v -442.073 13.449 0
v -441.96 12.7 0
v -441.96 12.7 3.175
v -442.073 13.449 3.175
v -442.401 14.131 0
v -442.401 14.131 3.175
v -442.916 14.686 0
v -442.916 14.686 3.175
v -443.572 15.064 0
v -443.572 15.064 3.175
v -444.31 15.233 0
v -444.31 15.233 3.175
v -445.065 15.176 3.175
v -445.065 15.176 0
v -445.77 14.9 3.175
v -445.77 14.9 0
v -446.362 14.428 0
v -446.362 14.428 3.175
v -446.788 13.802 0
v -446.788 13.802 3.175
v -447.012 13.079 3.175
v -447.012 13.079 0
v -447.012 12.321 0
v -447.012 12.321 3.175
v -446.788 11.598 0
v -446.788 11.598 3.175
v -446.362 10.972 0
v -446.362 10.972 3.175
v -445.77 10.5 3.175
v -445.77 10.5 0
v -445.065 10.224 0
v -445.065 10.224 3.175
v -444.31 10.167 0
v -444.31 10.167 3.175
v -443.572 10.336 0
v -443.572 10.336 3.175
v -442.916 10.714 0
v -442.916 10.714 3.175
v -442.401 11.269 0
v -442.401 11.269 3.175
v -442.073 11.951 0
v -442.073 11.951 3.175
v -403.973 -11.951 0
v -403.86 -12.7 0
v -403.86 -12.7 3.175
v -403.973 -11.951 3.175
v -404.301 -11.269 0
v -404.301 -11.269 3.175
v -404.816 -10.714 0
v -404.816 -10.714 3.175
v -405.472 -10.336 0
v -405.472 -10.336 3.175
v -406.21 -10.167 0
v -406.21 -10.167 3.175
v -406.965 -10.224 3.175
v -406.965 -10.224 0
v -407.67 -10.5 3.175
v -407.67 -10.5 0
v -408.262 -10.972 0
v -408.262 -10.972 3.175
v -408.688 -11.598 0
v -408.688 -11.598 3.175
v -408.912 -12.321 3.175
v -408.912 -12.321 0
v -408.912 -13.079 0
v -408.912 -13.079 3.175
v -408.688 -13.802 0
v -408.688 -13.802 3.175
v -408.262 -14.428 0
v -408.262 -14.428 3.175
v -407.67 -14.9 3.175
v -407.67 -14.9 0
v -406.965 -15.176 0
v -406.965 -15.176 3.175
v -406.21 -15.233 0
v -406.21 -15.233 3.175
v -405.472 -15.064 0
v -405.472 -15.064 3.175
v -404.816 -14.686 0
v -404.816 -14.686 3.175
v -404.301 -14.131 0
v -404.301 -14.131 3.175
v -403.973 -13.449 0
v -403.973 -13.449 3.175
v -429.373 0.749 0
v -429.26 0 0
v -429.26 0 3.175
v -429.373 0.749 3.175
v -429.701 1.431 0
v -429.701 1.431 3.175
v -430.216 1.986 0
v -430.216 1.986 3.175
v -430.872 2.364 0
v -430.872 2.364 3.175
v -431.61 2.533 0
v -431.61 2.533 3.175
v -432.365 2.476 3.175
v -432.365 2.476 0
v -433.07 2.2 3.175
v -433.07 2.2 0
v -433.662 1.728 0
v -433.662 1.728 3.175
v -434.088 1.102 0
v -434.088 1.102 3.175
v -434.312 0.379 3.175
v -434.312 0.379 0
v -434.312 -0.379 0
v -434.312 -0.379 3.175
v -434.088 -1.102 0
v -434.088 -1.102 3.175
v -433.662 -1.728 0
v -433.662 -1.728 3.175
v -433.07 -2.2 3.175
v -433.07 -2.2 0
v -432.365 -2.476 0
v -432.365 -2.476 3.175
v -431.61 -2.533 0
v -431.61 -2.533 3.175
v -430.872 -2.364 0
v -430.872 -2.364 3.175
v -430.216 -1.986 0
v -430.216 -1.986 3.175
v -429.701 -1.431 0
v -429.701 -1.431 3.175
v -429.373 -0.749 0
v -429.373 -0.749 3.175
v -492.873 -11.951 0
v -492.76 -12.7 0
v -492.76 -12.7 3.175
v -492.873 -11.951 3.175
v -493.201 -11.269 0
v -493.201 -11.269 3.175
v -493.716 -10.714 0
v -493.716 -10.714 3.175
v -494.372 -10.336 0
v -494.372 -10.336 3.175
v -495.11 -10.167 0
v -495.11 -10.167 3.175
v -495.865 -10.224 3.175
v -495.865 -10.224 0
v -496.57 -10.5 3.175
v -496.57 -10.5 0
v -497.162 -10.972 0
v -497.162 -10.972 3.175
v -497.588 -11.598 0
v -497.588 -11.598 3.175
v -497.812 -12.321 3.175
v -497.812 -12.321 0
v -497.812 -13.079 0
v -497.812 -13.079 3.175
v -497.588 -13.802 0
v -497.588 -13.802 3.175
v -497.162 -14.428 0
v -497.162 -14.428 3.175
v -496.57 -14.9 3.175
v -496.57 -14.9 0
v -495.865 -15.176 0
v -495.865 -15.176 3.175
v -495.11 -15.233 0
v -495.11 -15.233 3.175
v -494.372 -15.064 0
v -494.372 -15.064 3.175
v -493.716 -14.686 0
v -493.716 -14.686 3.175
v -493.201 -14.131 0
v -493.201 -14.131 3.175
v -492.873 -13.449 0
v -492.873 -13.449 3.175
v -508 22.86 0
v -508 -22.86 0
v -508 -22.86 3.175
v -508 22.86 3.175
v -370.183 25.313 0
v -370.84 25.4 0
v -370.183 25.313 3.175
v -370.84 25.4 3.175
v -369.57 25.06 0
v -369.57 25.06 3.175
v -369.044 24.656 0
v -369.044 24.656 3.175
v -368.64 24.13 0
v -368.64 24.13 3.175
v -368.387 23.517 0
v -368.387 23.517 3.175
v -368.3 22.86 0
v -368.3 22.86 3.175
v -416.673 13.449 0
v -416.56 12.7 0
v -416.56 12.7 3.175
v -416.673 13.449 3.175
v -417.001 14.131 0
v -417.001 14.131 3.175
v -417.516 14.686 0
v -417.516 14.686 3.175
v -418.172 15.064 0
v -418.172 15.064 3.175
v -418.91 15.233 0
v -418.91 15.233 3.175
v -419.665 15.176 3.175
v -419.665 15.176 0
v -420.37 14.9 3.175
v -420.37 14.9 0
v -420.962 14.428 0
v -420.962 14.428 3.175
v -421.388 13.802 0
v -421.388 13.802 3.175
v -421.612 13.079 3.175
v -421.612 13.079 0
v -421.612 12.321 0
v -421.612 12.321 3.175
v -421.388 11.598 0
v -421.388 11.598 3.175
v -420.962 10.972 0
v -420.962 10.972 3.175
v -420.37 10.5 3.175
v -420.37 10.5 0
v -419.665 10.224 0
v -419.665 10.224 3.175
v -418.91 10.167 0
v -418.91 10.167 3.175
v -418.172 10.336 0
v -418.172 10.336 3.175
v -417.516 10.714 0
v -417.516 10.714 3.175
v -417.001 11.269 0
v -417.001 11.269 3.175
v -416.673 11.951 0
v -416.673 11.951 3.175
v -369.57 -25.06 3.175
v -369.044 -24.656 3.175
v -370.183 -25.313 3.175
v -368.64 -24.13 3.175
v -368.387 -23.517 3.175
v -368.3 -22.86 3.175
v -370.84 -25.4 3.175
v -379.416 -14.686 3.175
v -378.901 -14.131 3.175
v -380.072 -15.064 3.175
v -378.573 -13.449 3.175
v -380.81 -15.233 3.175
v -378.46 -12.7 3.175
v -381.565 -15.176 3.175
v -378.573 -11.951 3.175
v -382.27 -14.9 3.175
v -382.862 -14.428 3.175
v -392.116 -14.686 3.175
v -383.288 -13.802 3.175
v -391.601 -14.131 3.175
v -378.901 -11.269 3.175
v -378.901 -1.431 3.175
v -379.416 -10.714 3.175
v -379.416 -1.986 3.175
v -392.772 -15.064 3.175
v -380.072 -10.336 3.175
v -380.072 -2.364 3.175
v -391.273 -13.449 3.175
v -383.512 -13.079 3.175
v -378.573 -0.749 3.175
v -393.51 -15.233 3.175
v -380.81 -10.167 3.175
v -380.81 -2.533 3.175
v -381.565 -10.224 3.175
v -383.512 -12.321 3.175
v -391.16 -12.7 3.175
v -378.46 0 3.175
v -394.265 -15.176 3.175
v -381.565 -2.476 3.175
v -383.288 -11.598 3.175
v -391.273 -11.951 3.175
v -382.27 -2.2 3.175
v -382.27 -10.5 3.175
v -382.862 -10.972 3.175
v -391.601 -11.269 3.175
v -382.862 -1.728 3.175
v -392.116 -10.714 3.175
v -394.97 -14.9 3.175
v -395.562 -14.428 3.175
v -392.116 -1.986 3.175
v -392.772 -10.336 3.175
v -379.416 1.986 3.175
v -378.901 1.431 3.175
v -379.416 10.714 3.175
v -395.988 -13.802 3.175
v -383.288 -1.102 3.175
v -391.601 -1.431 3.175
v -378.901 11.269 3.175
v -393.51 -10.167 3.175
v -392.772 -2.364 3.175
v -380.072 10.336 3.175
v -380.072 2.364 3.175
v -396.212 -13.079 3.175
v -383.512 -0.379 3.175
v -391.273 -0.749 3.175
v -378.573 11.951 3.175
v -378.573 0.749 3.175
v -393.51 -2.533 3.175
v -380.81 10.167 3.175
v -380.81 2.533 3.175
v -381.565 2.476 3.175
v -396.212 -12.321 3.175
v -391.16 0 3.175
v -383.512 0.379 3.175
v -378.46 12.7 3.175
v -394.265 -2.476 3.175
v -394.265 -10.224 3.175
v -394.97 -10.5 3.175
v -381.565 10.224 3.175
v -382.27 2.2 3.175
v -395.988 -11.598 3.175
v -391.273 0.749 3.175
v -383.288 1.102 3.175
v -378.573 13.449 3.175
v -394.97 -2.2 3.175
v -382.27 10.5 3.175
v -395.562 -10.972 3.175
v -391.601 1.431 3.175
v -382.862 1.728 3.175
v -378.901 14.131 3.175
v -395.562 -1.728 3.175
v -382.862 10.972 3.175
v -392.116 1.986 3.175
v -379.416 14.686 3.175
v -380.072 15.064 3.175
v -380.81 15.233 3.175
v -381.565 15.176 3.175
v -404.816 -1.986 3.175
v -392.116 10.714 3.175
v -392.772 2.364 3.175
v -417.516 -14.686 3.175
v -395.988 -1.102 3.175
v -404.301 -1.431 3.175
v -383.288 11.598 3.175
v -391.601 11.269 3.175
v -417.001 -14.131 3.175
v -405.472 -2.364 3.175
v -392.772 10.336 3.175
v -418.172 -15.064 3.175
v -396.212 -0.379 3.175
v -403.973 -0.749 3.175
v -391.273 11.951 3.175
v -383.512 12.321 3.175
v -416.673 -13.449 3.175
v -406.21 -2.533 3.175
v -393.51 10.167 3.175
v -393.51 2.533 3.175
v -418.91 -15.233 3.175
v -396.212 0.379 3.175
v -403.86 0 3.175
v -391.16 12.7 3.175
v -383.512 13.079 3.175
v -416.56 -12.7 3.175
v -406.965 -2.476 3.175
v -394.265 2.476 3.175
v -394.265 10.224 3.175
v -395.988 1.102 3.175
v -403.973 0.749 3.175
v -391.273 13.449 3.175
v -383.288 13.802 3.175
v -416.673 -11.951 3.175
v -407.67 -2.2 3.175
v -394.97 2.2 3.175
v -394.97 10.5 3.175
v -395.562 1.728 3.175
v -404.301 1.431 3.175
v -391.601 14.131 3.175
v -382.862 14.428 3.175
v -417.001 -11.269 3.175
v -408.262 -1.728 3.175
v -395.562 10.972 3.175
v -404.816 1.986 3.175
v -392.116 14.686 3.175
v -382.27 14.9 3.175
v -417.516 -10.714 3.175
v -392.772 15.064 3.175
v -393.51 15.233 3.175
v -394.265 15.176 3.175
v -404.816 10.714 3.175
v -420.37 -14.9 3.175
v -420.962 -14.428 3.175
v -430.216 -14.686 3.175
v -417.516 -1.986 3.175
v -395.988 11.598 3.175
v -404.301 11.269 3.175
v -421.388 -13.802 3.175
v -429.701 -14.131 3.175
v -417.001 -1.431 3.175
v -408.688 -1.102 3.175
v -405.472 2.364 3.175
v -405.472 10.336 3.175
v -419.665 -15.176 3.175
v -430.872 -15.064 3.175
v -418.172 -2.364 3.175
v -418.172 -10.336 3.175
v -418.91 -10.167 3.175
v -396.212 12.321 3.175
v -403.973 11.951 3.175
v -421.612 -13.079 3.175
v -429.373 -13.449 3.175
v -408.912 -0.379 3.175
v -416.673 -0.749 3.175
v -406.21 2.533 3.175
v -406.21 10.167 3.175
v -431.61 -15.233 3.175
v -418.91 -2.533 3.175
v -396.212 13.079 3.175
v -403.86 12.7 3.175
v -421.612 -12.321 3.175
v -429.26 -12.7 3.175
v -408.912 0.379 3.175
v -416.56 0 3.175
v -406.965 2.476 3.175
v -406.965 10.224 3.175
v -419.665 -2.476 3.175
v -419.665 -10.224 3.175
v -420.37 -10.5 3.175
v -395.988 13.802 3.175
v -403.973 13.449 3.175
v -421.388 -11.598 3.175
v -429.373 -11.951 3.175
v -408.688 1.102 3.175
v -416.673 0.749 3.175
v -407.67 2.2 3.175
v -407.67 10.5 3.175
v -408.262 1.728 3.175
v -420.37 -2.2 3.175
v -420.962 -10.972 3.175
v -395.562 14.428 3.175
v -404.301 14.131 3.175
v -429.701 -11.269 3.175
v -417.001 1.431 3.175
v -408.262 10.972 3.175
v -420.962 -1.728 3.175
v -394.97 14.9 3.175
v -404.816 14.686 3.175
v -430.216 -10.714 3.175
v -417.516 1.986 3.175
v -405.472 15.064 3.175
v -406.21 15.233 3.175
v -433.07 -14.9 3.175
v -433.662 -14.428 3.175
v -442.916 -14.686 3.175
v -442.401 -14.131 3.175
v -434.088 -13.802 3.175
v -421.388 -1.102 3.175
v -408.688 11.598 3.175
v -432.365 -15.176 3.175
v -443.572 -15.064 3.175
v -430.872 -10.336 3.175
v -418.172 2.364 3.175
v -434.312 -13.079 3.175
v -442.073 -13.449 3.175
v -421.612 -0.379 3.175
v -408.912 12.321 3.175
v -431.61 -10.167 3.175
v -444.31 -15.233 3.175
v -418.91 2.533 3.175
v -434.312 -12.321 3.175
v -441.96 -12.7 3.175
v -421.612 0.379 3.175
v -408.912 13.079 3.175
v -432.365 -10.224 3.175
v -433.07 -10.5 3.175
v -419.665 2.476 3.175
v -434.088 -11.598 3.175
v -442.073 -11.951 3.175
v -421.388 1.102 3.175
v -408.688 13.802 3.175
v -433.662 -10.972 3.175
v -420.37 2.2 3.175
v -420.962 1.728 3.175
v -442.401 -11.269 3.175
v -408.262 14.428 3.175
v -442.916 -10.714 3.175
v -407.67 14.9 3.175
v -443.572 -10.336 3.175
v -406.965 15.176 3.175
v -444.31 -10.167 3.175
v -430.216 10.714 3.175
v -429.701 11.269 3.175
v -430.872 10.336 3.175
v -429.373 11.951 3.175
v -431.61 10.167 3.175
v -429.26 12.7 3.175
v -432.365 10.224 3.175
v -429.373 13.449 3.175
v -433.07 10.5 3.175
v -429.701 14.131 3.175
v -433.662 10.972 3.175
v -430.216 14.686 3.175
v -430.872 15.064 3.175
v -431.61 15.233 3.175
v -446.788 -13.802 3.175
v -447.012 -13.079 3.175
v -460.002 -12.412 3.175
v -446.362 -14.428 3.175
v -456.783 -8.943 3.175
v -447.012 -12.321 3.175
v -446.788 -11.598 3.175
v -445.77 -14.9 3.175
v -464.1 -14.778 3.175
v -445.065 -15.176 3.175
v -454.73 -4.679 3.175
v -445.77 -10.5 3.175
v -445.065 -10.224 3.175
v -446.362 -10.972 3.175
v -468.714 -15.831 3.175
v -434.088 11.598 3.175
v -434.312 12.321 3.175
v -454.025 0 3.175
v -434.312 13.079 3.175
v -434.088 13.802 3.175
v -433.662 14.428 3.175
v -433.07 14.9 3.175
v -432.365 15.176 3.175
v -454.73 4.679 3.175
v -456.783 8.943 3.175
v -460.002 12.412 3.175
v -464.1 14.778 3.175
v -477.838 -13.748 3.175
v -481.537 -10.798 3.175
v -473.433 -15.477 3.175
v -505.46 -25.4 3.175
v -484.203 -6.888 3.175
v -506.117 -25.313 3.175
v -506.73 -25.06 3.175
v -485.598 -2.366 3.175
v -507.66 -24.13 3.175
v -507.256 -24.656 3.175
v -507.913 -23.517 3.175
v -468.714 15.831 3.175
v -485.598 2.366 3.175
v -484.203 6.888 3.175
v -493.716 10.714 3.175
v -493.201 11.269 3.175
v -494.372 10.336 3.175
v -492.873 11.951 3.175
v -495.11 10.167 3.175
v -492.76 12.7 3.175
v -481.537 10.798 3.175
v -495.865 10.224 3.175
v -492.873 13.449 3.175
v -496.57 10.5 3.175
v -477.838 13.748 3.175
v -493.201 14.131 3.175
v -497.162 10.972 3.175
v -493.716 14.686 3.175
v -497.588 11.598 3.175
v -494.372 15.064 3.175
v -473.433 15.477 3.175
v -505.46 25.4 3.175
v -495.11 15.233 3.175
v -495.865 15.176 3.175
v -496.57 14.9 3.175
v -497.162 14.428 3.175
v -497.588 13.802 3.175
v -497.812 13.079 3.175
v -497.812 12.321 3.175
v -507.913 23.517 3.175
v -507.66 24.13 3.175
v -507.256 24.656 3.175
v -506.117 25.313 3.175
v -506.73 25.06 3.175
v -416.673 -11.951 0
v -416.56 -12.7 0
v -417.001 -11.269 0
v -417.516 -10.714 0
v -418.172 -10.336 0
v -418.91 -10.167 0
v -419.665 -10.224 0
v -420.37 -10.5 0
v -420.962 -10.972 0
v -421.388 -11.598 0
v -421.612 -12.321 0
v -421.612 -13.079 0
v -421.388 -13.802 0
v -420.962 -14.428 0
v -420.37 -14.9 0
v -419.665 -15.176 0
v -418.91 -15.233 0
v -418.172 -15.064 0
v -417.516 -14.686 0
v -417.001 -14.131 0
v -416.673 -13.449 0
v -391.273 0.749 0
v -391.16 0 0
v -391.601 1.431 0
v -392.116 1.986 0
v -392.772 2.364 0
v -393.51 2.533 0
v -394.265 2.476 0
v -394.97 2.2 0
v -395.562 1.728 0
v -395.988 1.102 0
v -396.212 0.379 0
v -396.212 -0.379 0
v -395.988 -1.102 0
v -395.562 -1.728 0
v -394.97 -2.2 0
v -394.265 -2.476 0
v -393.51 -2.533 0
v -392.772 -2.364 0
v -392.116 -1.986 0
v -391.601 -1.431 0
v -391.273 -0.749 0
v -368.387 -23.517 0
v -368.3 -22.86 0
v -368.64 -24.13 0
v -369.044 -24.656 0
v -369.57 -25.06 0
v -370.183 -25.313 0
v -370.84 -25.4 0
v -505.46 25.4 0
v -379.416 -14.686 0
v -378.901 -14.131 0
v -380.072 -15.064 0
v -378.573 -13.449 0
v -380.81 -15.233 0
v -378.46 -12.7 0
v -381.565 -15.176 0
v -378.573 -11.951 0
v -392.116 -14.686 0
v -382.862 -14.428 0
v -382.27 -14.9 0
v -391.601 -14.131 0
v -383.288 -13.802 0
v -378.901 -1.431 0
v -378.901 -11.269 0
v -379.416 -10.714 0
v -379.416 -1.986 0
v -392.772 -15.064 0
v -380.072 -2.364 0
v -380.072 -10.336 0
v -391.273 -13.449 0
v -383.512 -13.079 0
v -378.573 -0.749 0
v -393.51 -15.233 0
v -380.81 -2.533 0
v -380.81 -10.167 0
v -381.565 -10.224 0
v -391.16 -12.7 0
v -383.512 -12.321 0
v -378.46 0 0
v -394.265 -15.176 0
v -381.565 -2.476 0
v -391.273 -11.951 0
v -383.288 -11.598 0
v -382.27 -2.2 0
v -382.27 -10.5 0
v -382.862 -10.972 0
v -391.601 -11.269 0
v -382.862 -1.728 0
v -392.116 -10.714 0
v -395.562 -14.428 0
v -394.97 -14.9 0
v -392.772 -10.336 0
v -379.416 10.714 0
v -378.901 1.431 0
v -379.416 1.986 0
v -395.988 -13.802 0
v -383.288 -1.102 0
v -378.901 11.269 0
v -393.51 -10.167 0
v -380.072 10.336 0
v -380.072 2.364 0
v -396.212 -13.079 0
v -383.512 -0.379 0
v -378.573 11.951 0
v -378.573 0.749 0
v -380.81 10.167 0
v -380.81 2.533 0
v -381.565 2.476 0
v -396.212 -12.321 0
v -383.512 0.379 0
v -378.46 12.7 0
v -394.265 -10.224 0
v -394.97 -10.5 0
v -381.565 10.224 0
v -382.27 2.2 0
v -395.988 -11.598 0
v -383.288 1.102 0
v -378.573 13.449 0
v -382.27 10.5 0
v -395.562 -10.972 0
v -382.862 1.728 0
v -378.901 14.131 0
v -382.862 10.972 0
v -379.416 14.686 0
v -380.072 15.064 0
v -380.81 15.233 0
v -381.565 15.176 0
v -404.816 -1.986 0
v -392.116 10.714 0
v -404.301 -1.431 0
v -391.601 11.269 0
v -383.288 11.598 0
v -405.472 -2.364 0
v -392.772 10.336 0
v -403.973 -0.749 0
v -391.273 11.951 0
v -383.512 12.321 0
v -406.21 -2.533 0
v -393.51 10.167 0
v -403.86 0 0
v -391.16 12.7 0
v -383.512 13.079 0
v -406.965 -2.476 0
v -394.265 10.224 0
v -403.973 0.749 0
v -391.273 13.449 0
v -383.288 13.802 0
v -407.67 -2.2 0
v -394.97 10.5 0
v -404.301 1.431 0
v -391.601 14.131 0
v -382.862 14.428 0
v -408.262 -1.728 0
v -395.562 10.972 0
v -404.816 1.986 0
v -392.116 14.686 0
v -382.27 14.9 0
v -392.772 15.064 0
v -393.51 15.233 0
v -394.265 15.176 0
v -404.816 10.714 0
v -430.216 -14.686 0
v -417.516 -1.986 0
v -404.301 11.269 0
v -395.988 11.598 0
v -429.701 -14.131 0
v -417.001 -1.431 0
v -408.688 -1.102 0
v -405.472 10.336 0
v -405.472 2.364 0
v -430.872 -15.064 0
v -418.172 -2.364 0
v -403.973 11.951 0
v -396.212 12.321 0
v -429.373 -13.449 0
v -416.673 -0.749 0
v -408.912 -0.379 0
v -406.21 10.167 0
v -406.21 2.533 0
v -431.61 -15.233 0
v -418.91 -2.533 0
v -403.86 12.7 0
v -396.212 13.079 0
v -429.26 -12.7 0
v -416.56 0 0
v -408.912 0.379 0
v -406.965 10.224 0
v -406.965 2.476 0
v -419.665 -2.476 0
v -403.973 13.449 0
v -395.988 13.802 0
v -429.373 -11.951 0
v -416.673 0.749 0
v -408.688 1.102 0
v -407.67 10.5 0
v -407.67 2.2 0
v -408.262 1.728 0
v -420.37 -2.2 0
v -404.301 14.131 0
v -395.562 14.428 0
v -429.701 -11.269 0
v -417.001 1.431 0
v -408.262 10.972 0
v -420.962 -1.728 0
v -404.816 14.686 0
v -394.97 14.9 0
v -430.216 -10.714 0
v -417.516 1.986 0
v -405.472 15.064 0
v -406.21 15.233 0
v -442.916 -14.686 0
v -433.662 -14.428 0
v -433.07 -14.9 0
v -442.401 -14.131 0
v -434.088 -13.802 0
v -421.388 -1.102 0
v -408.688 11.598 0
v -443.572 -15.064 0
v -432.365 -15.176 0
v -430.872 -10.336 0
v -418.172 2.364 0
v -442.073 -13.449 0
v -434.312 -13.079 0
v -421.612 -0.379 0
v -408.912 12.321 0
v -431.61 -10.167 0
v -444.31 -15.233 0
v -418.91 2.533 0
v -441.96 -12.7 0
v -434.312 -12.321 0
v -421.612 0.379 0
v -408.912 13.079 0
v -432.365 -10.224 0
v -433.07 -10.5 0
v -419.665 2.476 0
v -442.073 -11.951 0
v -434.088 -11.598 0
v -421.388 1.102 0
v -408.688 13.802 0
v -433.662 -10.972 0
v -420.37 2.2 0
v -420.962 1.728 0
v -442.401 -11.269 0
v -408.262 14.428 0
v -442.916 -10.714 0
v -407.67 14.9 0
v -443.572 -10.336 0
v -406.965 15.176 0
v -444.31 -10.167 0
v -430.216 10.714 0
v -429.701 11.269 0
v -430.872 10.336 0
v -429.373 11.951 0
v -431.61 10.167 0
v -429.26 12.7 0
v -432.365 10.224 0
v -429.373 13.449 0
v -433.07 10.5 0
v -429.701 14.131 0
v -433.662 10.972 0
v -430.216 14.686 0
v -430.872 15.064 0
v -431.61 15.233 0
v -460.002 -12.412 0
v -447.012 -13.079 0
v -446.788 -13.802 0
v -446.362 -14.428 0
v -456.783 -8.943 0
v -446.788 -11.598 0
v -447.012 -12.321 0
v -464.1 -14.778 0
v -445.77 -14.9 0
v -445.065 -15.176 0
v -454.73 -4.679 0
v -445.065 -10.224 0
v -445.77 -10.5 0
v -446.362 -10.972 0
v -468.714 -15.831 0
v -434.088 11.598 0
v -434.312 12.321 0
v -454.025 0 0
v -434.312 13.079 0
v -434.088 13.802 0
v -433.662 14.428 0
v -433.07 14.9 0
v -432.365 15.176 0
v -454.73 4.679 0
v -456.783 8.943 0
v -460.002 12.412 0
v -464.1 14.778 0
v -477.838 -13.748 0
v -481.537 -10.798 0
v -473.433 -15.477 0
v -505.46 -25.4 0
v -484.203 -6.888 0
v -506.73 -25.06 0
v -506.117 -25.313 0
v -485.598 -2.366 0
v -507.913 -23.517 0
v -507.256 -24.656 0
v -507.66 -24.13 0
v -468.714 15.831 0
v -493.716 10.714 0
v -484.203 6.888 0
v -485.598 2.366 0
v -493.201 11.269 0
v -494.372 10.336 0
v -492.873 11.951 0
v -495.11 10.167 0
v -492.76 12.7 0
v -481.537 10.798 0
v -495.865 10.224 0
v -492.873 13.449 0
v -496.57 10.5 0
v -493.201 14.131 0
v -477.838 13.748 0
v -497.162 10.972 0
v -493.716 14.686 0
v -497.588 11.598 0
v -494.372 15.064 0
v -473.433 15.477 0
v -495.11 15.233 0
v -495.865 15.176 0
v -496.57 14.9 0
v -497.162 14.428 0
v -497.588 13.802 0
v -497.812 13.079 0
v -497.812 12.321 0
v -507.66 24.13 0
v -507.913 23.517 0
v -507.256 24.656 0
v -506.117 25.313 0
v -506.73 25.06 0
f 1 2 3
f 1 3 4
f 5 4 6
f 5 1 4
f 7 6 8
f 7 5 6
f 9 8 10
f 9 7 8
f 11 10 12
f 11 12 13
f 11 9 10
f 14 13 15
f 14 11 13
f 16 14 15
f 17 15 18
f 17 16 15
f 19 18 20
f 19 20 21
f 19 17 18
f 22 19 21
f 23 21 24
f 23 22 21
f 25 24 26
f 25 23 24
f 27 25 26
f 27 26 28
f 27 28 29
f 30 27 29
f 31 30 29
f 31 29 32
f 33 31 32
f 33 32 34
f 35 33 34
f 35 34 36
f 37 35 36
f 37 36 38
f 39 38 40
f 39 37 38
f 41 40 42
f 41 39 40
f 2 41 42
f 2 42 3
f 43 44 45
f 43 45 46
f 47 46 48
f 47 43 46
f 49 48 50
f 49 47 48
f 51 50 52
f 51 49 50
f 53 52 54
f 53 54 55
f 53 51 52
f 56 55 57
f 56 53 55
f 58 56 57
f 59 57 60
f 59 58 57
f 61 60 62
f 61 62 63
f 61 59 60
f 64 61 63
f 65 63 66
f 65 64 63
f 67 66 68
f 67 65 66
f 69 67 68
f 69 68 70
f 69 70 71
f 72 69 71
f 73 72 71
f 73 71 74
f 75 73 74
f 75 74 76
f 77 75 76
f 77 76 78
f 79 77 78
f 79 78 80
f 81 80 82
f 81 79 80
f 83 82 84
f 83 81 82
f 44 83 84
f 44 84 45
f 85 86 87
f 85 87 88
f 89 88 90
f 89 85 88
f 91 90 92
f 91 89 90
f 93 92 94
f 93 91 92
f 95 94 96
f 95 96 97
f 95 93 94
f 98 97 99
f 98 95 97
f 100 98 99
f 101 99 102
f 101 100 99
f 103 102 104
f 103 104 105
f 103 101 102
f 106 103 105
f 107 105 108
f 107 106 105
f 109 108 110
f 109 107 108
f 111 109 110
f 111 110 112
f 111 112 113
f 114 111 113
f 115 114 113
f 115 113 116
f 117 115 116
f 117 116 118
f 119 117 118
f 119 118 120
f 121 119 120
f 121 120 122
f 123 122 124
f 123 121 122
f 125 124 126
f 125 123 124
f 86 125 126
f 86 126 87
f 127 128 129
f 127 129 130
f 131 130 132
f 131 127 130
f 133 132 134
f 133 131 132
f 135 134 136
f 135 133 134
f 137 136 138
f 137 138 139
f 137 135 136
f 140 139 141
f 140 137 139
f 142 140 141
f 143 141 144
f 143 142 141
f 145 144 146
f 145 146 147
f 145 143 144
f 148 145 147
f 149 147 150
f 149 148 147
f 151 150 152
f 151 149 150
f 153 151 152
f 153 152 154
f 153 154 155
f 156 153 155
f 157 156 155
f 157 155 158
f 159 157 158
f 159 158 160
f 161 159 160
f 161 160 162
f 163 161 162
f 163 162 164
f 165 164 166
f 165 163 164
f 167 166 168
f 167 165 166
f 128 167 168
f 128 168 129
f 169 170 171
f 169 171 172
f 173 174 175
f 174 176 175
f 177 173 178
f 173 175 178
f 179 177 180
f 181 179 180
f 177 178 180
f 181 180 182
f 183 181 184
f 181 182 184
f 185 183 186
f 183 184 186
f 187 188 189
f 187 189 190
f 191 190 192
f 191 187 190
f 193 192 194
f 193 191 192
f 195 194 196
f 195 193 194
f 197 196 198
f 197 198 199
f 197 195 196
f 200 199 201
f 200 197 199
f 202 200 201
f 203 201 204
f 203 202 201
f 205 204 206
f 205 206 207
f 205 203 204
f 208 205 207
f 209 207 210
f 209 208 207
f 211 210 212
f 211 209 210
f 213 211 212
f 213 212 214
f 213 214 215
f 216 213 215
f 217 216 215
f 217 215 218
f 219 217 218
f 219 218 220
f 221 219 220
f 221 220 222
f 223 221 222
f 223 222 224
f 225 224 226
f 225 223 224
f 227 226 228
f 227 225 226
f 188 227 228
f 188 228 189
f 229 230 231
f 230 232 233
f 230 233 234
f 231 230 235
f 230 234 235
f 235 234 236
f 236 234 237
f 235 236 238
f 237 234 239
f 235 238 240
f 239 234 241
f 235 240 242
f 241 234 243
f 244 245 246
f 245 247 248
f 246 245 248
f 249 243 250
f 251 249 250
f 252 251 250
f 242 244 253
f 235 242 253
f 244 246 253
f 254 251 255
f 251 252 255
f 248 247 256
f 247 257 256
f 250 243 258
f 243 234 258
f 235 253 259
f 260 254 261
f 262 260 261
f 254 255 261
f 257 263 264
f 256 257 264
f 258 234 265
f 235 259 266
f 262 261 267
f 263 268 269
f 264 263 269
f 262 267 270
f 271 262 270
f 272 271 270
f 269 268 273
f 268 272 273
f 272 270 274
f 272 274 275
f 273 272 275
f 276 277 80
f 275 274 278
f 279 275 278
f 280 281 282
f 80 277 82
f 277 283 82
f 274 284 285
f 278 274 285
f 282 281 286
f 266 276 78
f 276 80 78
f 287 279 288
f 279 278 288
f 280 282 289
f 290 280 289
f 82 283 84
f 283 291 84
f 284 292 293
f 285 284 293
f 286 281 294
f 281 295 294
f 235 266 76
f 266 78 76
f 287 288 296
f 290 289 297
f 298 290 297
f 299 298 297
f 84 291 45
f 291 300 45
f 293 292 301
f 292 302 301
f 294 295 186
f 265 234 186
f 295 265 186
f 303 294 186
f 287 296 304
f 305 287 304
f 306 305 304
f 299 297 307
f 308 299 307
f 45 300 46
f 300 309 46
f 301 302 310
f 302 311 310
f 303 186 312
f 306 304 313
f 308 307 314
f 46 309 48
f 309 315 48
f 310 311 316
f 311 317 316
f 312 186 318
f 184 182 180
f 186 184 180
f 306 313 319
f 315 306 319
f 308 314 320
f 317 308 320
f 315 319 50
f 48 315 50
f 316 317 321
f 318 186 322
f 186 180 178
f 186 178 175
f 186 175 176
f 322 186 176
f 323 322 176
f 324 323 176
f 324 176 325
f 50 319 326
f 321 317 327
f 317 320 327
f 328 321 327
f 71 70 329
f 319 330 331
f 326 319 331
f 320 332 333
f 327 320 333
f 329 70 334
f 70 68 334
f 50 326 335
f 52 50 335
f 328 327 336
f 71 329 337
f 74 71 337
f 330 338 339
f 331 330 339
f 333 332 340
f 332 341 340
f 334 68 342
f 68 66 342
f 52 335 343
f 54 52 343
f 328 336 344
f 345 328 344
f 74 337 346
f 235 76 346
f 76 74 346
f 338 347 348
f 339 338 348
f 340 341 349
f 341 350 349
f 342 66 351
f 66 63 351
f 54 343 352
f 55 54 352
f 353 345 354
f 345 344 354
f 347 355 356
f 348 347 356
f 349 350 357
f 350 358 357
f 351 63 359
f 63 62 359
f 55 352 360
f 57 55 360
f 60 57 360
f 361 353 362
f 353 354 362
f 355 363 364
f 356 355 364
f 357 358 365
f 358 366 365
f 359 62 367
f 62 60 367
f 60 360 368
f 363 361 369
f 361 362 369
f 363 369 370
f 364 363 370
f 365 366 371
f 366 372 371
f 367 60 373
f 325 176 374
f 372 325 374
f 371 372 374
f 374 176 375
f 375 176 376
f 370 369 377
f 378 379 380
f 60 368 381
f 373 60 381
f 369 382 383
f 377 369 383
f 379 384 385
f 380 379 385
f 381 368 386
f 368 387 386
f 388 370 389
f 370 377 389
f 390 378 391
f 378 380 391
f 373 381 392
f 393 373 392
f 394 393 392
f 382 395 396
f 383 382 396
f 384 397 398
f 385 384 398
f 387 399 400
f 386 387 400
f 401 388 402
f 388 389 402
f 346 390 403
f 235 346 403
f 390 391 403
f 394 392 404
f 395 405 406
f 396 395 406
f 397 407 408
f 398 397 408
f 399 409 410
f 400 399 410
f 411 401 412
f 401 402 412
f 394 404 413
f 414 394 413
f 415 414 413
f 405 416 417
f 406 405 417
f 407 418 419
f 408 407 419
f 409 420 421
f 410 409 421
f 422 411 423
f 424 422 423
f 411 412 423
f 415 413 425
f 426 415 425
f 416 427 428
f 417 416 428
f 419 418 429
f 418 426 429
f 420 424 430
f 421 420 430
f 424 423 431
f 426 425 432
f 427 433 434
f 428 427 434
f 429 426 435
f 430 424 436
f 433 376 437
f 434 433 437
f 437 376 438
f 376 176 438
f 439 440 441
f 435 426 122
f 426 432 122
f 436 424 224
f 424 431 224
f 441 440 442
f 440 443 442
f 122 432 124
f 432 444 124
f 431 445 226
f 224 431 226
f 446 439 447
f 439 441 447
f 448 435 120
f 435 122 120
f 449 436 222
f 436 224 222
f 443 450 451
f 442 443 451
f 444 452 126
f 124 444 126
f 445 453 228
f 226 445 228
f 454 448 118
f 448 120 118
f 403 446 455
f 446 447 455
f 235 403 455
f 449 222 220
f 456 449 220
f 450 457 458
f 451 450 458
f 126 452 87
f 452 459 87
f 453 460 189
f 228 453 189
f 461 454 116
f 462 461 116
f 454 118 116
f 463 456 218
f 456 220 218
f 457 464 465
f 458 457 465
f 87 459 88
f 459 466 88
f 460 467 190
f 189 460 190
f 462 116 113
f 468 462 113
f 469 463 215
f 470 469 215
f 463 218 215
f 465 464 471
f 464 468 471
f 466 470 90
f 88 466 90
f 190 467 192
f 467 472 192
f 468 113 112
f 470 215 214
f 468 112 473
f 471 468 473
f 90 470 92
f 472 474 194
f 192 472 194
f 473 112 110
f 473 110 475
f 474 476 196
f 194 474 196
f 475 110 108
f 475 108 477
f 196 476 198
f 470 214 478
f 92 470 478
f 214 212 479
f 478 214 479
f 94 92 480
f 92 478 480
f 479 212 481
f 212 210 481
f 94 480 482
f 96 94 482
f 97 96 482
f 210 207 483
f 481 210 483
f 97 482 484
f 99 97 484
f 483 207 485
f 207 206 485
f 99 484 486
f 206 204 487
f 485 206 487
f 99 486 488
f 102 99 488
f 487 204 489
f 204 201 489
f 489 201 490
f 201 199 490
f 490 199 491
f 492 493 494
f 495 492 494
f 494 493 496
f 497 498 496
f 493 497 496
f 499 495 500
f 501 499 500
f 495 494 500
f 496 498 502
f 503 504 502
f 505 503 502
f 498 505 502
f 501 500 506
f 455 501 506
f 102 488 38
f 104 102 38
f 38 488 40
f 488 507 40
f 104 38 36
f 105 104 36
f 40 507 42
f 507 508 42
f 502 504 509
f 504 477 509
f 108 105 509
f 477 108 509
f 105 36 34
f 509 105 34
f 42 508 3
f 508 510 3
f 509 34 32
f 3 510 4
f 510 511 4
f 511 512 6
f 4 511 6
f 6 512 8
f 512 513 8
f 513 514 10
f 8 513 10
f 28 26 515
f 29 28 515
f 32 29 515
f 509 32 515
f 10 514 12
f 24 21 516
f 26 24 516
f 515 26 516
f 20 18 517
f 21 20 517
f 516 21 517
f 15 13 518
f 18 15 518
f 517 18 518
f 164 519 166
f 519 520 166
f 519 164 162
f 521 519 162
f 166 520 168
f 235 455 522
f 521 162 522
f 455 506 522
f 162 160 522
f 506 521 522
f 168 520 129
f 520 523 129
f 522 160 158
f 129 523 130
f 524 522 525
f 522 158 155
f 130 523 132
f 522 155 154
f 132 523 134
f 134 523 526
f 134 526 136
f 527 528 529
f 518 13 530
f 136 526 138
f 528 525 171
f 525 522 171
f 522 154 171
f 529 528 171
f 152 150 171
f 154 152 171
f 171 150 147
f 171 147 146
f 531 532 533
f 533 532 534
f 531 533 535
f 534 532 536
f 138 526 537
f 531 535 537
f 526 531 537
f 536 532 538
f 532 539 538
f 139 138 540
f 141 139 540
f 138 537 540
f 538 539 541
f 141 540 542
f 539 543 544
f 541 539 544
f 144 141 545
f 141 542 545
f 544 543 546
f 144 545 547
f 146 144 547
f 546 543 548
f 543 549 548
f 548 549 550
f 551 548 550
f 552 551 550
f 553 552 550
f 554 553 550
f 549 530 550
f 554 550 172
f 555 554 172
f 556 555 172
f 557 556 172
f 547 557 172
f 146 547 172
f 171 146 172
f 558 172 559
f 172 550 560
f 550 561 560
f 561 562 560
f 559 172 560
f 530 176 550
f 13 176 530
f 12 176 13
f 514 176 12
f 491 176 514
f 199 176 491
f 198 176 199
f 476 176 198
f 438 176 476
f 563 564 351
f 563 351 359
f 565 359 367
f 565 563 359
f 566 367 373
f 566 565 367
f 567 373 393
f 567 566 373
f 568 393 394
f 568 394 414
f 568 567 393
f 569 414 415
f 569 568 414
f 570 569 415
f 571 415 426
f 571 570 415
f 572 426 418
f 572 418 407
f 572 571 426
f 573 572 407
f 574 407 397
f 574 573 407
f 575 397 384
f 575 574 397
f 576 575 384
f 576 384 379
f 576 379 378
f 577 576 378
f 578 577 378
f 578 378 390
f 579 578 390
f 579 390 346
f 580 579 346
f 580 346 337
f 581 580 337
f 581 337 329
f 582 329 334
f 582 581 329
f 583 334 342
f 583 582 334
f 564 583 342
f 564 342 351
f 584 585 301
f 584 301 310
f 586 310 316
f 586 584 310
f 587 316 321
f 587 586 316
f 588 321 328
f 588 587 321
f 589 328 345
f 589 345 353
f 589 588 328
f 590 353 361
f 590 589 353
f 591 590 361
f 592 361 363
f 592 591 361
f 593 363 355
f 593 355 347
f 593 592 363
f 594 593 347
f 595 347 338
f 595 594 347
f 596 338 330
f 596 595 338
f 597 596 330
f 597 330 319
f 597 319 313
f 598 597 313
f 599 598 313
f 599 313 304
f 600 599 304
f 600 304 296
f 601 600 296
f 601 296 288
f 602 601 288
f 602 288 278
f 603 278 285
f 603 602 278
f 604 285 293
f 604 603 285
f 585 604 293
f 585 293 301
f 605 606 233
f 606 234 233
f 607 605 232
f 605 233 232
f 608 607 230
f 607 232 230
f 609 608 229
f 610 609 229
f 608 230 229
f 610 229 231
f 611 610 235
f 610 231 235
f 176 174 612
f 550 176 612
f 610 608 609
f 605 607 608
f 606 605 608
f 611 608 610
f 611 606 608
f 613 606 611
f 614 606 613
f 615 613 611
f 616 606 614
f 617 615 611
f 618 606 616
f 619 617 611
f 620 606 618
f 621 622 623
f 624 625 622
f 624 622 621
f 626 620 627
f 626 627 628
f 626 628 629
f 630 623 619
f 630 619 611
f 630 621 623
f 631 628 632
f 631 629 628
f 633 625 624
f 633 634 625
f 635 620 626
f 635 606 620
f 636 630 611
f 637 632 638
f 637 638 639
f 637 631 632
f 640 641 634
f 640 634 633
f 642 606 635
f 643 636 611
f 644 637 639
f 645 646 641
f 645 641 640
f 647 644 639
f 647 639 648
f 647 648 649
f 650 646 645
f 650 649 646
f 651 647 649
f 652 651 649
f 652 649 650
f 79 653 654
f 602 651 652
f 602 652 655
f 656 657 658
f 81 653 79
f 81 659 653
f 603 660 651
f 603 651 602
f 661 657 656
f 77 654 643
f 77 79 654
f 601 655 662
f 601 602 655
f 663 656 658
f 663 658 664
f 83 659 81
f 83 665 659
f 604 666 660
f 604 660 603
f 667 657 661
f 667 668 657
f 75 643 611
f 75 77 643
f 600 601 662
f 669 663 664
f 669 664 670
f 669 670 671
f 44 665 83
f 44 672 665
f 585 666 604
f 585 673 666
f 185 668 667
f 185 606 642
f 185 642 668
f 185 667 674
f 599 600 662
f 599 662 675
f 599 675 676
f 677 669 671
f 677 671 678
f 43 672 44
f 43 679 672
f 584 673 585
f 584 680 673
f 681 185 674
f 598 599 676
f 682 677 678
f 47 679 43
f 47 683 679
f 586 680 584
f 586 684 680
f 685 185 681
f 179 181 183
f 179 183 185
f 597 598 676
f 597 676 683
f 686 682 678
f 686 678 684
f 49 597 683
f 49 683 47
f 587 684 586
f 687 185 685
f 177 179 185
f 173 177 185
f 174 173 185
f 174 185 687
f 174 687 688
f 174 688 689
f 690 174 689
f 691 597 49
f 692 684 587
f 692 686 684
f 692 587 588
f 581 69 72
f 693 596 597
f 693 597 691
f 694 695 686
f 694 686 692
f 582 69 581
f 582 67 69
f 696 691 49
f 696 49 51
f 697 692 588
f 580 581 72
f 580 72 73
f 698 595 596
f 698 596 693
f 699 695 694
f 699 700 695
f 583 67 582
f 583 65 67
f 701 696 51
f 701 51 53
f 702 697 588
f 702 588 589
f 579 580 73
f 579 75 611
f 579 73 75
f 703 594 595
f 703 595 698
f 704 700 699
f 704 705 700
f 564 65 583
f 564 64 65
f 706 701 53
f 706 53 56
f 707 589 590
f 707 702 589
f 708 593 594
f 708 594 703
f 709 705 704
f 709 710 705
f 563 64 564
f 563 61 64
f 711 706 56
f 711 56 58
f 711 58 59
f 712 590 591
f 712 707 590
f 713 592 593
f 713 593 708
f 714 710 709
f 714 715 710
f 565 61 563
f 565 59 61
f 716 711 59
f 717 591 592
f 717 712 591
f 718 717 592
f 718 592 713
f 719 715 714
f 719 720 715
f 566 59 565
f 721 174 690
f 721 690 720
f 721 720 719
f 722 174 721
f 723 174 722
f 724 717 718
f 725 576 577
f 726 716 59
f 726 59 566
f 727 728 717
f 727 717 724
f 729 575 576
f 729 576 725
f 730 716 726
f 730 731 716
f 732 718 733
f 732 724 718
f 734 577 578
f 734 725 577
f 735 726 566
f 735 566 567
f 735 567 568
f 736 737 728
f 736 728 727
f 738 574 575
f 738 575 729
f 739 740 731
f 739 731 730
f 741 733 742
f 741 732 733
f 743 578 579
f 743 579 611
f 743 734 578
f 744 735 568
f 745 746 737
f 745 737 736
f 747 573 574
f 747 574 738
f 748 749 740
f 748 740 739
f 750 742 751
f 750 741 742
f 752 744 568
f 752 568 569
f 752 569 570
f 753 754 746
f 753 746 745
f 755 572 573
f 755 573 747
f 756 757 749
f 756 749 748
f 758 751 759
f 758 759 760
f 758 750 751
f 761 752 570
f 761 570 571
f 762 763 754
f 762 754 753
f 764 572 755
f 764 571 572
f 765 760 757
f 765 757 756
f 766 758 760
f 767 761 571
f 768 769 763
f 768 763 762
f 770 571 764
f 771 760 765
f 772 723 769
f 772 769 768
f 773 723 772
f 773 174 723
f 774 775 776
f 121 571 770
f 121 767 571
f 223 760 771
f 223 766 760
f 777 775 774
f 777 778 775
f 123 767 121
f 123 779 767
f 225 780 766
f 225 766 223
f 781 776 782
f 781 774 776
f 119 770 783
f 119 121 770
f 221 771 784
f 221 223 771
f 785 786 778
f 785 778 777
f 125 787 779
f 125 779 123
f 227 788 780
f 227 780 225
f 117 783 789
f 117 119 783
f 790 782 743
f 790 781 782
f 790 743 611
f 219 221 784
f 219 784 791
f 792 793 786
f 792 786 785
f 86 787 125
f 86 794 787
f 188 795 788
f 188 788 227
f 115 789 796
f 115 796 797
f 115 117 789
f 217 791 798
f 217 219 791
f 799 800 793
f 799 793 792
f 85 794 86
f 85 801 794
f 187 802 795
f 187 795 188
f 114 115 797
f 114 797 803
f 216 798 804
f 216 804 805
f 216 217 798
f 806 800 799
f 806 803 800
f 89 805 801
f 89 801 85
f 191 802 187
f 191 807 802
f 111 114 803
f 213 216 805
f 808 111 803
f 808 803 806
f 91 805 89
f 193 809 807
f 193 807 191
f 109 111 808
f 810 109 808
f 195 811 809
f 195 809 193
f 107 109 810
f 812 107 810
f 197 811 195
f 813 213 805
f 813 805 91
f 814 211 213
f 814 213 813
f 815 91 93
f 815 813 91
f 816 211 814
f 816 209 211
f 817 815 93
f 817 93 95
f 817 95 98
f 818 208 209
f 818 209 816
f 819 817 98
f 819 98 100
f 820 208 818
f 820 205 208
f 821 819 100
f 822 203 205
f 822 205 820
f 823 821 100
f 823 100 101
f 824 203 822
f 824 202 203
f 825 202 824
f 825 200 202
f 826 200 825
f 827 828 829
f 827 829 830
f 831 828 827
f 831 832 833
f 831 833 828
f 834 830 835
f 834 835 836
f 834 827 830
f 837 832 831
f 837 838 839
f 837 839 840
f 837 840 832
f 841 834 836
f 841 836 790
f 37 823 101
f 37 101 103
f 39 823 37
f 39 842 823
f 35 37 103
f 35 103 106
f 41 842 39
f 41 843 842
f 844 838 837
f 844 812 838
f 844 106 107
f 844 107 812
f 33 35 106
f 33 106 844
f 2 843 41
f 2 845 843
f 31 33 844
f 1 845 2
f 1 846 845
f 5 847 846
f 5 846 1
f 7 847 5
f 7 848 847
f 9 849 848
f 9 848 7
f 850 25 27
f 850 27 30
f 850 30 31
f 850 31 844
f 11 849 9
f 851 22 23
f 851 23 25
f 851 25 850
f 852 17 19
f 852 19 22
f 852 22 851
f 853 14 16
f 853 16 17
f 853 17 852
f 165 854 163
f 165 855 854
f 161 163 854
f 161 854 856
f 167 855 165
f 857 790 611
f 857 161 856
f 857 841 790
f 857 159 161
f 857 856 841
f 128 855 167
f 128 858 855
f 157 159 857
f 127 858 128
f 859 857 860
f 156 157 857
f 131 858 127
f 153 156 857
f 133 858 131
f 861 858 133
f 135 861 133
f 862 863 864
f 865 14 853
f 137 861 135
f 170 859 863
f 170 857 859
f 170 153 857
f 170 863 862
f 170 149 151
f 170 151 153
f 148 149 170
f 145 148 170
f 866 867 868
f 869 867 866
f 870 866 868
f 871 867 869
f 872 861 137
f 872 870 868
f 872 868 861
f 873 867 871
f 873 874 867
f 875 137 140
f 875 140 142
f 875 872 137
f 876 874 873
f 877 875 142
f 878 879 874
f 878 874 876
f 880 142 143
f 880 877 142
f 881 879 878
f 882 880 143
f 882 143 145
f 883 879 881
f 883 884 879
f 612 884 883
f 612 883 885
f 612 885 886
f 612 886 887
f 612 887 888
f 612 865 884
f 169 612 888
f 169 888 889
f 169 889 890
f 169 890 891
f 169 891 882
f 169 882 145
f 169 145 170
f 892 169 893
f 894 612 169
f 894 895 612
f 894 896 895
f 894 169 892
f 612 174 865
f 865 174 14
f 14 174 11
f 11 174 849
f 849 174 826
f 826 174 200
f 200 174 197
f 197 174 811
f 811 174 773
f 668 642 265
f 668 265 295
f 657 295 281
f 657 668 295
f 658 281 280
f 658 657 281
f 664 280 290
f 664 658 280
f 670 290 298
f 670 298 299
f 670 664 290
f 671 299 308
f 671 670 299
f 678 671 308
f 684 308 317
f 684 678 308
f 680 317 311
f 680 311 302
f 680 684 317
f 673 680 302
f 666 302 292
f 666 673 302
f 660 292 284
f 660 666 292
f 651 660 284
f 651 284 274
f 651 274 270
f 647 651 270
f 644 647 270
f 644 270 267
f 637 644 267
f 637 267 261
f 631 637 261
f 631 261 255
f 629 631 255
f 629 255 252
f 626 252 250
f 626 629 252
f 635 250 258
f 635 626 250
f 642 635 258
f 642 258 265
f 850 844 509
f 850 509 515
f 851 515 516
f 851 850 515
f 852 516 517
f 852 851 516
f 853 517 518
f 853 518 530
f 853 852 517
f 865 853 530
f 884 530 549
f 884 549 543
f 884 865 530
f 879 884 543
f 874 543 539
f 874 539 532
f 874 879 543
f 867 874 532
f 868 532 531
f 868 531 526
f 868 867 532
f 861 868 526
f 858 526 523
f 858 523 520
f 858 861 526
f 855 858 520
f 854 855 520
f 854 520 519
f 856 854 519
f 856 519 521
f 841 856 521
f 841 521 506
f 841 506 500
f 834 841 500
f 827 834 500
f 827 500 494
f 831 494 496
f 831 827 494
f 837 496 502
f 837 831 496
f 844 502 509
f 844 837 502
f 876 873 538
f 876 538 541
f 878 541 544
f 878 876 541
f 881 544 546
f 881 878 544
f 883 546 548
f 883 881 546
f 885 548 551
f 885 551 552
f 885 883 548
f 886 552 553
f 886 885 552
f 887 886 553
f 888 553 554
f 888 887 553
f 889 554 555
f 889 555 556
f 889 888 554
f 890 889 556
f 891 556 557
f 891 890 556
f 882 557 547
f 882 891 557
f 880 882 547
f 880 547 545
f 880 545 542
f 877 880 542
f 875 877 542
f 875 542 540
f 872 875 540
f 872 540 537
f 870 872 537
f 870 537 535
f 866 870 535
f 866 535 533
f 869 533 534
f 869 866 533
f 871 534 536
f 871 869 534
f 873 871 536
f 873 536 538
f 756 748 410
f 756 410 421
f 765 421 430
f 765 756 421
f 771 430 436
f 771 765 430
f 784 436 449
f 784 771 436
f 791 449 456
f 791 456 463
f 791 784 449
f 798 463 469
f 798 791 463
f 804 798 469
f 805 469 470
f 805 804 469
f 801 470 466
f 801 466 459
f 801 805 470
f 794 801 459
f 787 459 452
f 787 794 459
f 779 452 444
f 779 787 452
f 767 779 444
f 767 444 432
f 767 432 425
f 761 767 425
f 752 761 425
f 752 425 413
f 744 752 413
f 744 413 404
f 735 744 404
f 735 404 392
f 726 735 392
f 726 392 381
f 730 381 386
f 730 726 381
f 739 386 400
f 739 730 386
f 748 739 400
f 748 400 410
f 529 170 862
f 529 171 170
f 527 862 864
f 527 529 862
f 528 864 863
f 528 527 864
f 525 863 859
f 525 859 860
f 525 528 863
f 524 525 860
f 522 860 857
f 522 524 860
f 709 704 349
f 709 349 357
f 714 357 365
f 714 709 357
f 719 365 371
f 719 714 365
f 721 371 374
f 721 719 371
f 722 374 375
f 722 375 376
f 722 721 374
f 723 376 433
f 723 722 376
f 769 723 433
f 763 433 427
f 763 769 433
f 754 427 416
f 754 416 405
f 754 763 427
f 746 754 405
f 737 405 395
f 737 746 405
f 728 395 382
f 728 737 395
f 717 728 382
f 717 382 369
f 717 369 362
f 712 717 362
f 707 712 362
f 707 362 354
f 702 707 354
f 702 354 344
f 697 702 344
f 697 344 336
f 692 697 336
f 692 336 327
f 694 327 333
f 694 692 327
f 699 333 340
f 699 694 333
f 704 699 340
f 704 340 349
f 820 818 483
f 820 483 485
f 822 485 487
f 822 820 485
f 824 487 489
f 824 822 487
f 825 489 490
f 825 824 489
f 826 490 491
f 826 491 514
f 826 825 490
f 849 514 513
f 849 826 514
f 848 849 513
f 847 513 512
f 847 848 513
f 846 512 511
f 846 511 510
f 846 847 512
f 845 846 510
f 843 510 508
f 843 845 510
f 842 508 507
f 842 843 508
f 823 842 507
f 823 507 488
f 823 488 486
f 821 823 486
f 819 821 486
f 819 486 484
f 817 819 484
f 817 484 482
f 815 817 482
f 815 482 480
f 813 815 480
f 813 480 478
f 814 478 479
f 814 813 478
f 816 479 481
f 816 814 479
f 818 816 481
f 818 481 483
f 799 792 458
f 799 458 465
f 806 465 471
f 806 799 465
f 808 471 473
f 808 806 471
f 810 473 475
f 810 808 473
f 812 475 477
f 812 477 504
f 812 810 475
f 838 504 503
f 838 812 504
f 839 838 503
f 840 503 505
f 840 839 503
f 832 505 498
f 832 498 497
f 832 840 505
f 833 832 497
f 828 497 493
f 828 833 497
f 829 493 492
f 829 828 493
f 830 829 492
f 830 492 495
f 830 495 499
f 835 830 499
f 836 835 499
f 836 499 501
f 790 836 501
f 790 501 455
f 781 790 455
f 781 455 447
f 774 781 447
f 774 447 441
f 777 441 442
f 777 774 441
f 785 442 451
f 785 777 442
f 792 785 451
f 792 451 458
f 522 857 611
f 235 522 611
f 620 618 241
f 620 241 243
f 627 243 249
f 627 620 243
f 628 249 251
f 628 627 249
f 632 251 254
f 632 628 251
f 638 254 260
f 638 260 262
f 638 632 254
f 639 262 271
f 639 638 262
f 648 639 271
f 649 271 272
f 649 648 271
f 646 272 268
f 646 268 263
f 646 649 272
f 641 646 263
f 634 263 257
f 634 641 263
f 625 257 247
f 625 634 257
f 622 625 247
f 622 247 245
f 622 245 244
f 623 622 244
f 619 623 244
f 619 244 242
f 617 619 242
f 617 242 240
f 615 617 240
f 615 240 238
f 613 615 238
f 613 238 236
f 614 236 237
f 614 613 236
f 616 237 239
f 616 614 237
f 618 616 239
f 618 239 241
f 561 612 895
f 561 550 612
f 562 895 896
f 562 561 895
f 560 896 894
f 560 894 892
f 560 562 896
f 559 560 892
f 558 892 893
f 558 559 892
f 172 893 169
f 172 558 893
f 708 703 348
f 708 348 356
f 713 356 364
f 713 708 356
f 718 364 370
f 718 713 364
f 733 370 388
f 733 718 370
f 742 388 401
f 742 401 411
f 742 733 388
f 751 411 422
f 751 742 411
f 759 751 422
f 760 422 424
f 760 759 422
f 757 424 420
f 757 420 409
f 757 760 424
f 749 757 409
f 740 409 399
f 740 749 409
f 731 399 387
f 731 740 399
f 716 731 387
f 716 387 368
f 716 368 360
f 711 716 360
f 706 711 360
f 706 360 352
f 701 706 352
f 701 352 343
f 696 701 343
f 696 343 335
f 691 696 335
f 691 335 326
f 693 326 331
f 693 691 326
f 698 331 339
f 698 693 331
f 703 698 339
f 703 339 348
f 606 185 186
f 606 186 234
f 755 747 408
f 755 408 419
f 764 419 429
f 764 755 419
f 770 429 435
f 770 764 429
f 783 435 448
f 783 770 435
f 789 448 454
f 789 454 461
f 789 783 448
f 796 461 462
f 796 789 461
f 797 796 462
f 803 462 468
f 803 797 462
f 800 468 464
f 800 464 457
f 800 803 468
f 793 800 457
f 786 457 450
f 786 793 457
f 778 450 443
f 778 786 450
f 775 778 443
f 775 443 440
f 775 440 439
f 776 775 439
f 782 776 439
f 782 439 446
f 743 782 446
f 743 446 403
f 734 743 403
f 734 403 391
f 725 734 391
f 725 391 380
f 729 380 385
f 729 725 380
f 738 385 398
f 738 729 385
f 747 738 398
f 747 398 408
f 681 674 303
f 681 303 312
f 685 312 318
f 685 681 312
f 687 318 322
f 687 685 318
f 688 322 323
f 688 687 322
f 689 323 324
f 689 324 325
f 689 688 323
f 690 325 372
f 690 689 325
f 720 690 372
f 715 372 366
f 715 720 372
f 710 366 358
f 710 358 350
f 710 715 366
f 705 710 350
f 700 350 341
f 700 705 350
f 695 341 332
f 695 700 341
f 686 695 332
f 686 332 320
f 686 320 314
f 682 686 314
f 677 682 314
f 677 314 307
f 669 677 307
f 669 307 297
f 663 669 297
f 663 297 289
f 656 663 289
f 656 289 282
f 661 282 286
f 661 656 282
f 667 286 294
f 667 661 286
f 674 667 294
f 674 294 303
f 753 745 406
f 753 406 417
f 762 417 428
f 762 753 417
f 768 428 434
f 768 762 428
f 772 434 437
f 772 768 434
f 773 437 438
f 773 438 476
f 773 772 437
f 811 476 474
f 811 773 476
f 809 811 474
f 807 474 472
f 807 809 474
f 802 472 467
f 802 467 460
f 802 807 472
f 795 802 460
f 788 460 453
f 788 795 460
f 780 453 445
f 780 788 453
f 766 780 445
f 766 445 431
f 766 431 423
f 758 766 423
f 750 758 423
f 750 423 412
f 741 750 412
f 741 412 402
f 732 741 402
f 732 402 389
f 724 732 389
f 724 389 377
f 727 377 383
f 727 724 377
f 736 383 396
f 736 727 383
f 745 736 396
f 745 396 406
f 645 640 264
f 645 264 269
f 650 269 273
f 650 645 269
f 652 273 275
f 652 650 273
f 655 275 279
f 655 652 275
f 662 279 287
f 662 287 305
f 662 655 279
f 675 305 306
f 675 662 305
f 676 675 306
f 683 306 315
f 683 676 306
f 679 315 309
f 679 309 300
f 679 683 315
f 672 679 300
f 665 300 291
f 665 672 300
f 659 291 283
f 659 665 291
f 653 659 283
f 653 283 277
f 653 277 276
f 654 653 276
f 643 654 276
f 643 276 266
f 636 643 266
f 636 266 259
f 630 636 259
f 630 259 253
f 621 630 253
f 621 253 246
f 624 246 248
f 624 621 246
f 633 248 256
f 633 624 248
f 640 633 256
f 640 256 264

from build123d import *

# Parameters (mm, degrees)
SKETCH2_R           = 15.875
SKETCH2_R_2         = 2.54
BOSS_EXTRUDE1_DEPTH = 3.175
FILLET1_R           = 2.54


with BuildPart() as part:
    # Sketch2 → Boss-Extrude1 (new body)
    with BuildSketch(Plane.XY):
        Polygon((-508, 25.4), (-481.624580264, 25.4), (-457.99375, 25.4), (-431.8, 25.4), (-368.3, 25.4), (-368.3, -25.4), (-431.8, -25.4), (-457.99375, -25.4), (-481.624580264, -25.4), (-508, -25.4), align=None)
        with Locations((-469.9, 0)):
            Circle(SKETCH2_R, mode=Mode.SUBTRACT)
        with Locations((-495.3, 12.7)):
            Circle(SKETCH2_R_2, mode=Mode.SUBTRACT)
        with Locations((-495.3, -12.7)):
            Circle(SKETCH2_R_2, mode=Mode.SUBTRACT)
        with Locations((-444.5, -12.7)):
            Circle(SKETCH2_R_2, mode=Mode.SUBTRACT)
        with Locations((-431.8, -12.7)):
            Circle(SKETCH2_R_2, mode=Mode.SUBTRACT)
        with Locations((-419.1, -12.7)):
            Circle(SKETCH2_R_2, mode=Mode.SUBTRACT)
        with Locations((-419.1, 0)):
            Circle(SKETCH2_R_2, mode=Mode.SUBTRACT)
        with Locations((-431.8, 0)):
            Circle(SKETCH2_R_2, mode=Mode.SUBTRACT)
        with Locations((-431.8, 12.7)):
            Circle(SKETCH2_R_2, mode=Mode.SUBTRACT)
        with Locations((-419.1, 12.7)):
            Circle(SKETCH2_R_2, mode=Mode.SUBTRACT)
        with Locations((-444.5, 12.7)):
            Circle(SKETCH2_R_2, mode=Mode.SUBTRACT)
        with Locations((-406.4, 12.7)):
            Circle(SKETCH2_R_2, mode=Mode.SUBTRACT)
        with Locations((-406.4, 0)):
            Circle(SKETCH2_R_2, mode=Mode.SUBTRACT)
        with Locations((-406.4, -12.7)):
            Circle(SKETCH2_R_2, mode=Mode.SUBTRACT)
        with Locations((-393.7, 12.7)):
            Circle(SKETCH2_R_2, mode=Mode.SUBTRACT)
        with Locations((-393.7, 0)):
            Circle(SKETCH2_R_2, mode=Mode.SUBTRACT)
        with Locations((-393.7, -12.7)):
            Circle(SKETCH2_R_2, mode=Mode.SUBTRACT)
        with Locations((-381, 12.7)):
            Circle(SKETCH2_R_2, mode=Mode.SUBTRACT)
        with Locations((-381, 0)):
            Circle(SKETCH2_R_2, mode=Mode.SUBTRACT)
        with Locations((-381, -12.7)):
            Circle(SKETCH2_R_2, mode=Mode.SUBTRACT)
    extrude(amount=BOSS_EXTRUDE1_DEPTH)

    # Fillet1
    fillet1_edges = [part.edges().sort_by_distance(p)[0] for p in [
        (-508, 25.4, 1.5875),
        (-368.3, 25.4, 1.5875),
        (-368.3, -25.4, 1.5875),
        (-508, -25.4, 1.5875),
    ]]
    fillet(fillet1_edges, radius=FILLET1_R)


solid = part.part
